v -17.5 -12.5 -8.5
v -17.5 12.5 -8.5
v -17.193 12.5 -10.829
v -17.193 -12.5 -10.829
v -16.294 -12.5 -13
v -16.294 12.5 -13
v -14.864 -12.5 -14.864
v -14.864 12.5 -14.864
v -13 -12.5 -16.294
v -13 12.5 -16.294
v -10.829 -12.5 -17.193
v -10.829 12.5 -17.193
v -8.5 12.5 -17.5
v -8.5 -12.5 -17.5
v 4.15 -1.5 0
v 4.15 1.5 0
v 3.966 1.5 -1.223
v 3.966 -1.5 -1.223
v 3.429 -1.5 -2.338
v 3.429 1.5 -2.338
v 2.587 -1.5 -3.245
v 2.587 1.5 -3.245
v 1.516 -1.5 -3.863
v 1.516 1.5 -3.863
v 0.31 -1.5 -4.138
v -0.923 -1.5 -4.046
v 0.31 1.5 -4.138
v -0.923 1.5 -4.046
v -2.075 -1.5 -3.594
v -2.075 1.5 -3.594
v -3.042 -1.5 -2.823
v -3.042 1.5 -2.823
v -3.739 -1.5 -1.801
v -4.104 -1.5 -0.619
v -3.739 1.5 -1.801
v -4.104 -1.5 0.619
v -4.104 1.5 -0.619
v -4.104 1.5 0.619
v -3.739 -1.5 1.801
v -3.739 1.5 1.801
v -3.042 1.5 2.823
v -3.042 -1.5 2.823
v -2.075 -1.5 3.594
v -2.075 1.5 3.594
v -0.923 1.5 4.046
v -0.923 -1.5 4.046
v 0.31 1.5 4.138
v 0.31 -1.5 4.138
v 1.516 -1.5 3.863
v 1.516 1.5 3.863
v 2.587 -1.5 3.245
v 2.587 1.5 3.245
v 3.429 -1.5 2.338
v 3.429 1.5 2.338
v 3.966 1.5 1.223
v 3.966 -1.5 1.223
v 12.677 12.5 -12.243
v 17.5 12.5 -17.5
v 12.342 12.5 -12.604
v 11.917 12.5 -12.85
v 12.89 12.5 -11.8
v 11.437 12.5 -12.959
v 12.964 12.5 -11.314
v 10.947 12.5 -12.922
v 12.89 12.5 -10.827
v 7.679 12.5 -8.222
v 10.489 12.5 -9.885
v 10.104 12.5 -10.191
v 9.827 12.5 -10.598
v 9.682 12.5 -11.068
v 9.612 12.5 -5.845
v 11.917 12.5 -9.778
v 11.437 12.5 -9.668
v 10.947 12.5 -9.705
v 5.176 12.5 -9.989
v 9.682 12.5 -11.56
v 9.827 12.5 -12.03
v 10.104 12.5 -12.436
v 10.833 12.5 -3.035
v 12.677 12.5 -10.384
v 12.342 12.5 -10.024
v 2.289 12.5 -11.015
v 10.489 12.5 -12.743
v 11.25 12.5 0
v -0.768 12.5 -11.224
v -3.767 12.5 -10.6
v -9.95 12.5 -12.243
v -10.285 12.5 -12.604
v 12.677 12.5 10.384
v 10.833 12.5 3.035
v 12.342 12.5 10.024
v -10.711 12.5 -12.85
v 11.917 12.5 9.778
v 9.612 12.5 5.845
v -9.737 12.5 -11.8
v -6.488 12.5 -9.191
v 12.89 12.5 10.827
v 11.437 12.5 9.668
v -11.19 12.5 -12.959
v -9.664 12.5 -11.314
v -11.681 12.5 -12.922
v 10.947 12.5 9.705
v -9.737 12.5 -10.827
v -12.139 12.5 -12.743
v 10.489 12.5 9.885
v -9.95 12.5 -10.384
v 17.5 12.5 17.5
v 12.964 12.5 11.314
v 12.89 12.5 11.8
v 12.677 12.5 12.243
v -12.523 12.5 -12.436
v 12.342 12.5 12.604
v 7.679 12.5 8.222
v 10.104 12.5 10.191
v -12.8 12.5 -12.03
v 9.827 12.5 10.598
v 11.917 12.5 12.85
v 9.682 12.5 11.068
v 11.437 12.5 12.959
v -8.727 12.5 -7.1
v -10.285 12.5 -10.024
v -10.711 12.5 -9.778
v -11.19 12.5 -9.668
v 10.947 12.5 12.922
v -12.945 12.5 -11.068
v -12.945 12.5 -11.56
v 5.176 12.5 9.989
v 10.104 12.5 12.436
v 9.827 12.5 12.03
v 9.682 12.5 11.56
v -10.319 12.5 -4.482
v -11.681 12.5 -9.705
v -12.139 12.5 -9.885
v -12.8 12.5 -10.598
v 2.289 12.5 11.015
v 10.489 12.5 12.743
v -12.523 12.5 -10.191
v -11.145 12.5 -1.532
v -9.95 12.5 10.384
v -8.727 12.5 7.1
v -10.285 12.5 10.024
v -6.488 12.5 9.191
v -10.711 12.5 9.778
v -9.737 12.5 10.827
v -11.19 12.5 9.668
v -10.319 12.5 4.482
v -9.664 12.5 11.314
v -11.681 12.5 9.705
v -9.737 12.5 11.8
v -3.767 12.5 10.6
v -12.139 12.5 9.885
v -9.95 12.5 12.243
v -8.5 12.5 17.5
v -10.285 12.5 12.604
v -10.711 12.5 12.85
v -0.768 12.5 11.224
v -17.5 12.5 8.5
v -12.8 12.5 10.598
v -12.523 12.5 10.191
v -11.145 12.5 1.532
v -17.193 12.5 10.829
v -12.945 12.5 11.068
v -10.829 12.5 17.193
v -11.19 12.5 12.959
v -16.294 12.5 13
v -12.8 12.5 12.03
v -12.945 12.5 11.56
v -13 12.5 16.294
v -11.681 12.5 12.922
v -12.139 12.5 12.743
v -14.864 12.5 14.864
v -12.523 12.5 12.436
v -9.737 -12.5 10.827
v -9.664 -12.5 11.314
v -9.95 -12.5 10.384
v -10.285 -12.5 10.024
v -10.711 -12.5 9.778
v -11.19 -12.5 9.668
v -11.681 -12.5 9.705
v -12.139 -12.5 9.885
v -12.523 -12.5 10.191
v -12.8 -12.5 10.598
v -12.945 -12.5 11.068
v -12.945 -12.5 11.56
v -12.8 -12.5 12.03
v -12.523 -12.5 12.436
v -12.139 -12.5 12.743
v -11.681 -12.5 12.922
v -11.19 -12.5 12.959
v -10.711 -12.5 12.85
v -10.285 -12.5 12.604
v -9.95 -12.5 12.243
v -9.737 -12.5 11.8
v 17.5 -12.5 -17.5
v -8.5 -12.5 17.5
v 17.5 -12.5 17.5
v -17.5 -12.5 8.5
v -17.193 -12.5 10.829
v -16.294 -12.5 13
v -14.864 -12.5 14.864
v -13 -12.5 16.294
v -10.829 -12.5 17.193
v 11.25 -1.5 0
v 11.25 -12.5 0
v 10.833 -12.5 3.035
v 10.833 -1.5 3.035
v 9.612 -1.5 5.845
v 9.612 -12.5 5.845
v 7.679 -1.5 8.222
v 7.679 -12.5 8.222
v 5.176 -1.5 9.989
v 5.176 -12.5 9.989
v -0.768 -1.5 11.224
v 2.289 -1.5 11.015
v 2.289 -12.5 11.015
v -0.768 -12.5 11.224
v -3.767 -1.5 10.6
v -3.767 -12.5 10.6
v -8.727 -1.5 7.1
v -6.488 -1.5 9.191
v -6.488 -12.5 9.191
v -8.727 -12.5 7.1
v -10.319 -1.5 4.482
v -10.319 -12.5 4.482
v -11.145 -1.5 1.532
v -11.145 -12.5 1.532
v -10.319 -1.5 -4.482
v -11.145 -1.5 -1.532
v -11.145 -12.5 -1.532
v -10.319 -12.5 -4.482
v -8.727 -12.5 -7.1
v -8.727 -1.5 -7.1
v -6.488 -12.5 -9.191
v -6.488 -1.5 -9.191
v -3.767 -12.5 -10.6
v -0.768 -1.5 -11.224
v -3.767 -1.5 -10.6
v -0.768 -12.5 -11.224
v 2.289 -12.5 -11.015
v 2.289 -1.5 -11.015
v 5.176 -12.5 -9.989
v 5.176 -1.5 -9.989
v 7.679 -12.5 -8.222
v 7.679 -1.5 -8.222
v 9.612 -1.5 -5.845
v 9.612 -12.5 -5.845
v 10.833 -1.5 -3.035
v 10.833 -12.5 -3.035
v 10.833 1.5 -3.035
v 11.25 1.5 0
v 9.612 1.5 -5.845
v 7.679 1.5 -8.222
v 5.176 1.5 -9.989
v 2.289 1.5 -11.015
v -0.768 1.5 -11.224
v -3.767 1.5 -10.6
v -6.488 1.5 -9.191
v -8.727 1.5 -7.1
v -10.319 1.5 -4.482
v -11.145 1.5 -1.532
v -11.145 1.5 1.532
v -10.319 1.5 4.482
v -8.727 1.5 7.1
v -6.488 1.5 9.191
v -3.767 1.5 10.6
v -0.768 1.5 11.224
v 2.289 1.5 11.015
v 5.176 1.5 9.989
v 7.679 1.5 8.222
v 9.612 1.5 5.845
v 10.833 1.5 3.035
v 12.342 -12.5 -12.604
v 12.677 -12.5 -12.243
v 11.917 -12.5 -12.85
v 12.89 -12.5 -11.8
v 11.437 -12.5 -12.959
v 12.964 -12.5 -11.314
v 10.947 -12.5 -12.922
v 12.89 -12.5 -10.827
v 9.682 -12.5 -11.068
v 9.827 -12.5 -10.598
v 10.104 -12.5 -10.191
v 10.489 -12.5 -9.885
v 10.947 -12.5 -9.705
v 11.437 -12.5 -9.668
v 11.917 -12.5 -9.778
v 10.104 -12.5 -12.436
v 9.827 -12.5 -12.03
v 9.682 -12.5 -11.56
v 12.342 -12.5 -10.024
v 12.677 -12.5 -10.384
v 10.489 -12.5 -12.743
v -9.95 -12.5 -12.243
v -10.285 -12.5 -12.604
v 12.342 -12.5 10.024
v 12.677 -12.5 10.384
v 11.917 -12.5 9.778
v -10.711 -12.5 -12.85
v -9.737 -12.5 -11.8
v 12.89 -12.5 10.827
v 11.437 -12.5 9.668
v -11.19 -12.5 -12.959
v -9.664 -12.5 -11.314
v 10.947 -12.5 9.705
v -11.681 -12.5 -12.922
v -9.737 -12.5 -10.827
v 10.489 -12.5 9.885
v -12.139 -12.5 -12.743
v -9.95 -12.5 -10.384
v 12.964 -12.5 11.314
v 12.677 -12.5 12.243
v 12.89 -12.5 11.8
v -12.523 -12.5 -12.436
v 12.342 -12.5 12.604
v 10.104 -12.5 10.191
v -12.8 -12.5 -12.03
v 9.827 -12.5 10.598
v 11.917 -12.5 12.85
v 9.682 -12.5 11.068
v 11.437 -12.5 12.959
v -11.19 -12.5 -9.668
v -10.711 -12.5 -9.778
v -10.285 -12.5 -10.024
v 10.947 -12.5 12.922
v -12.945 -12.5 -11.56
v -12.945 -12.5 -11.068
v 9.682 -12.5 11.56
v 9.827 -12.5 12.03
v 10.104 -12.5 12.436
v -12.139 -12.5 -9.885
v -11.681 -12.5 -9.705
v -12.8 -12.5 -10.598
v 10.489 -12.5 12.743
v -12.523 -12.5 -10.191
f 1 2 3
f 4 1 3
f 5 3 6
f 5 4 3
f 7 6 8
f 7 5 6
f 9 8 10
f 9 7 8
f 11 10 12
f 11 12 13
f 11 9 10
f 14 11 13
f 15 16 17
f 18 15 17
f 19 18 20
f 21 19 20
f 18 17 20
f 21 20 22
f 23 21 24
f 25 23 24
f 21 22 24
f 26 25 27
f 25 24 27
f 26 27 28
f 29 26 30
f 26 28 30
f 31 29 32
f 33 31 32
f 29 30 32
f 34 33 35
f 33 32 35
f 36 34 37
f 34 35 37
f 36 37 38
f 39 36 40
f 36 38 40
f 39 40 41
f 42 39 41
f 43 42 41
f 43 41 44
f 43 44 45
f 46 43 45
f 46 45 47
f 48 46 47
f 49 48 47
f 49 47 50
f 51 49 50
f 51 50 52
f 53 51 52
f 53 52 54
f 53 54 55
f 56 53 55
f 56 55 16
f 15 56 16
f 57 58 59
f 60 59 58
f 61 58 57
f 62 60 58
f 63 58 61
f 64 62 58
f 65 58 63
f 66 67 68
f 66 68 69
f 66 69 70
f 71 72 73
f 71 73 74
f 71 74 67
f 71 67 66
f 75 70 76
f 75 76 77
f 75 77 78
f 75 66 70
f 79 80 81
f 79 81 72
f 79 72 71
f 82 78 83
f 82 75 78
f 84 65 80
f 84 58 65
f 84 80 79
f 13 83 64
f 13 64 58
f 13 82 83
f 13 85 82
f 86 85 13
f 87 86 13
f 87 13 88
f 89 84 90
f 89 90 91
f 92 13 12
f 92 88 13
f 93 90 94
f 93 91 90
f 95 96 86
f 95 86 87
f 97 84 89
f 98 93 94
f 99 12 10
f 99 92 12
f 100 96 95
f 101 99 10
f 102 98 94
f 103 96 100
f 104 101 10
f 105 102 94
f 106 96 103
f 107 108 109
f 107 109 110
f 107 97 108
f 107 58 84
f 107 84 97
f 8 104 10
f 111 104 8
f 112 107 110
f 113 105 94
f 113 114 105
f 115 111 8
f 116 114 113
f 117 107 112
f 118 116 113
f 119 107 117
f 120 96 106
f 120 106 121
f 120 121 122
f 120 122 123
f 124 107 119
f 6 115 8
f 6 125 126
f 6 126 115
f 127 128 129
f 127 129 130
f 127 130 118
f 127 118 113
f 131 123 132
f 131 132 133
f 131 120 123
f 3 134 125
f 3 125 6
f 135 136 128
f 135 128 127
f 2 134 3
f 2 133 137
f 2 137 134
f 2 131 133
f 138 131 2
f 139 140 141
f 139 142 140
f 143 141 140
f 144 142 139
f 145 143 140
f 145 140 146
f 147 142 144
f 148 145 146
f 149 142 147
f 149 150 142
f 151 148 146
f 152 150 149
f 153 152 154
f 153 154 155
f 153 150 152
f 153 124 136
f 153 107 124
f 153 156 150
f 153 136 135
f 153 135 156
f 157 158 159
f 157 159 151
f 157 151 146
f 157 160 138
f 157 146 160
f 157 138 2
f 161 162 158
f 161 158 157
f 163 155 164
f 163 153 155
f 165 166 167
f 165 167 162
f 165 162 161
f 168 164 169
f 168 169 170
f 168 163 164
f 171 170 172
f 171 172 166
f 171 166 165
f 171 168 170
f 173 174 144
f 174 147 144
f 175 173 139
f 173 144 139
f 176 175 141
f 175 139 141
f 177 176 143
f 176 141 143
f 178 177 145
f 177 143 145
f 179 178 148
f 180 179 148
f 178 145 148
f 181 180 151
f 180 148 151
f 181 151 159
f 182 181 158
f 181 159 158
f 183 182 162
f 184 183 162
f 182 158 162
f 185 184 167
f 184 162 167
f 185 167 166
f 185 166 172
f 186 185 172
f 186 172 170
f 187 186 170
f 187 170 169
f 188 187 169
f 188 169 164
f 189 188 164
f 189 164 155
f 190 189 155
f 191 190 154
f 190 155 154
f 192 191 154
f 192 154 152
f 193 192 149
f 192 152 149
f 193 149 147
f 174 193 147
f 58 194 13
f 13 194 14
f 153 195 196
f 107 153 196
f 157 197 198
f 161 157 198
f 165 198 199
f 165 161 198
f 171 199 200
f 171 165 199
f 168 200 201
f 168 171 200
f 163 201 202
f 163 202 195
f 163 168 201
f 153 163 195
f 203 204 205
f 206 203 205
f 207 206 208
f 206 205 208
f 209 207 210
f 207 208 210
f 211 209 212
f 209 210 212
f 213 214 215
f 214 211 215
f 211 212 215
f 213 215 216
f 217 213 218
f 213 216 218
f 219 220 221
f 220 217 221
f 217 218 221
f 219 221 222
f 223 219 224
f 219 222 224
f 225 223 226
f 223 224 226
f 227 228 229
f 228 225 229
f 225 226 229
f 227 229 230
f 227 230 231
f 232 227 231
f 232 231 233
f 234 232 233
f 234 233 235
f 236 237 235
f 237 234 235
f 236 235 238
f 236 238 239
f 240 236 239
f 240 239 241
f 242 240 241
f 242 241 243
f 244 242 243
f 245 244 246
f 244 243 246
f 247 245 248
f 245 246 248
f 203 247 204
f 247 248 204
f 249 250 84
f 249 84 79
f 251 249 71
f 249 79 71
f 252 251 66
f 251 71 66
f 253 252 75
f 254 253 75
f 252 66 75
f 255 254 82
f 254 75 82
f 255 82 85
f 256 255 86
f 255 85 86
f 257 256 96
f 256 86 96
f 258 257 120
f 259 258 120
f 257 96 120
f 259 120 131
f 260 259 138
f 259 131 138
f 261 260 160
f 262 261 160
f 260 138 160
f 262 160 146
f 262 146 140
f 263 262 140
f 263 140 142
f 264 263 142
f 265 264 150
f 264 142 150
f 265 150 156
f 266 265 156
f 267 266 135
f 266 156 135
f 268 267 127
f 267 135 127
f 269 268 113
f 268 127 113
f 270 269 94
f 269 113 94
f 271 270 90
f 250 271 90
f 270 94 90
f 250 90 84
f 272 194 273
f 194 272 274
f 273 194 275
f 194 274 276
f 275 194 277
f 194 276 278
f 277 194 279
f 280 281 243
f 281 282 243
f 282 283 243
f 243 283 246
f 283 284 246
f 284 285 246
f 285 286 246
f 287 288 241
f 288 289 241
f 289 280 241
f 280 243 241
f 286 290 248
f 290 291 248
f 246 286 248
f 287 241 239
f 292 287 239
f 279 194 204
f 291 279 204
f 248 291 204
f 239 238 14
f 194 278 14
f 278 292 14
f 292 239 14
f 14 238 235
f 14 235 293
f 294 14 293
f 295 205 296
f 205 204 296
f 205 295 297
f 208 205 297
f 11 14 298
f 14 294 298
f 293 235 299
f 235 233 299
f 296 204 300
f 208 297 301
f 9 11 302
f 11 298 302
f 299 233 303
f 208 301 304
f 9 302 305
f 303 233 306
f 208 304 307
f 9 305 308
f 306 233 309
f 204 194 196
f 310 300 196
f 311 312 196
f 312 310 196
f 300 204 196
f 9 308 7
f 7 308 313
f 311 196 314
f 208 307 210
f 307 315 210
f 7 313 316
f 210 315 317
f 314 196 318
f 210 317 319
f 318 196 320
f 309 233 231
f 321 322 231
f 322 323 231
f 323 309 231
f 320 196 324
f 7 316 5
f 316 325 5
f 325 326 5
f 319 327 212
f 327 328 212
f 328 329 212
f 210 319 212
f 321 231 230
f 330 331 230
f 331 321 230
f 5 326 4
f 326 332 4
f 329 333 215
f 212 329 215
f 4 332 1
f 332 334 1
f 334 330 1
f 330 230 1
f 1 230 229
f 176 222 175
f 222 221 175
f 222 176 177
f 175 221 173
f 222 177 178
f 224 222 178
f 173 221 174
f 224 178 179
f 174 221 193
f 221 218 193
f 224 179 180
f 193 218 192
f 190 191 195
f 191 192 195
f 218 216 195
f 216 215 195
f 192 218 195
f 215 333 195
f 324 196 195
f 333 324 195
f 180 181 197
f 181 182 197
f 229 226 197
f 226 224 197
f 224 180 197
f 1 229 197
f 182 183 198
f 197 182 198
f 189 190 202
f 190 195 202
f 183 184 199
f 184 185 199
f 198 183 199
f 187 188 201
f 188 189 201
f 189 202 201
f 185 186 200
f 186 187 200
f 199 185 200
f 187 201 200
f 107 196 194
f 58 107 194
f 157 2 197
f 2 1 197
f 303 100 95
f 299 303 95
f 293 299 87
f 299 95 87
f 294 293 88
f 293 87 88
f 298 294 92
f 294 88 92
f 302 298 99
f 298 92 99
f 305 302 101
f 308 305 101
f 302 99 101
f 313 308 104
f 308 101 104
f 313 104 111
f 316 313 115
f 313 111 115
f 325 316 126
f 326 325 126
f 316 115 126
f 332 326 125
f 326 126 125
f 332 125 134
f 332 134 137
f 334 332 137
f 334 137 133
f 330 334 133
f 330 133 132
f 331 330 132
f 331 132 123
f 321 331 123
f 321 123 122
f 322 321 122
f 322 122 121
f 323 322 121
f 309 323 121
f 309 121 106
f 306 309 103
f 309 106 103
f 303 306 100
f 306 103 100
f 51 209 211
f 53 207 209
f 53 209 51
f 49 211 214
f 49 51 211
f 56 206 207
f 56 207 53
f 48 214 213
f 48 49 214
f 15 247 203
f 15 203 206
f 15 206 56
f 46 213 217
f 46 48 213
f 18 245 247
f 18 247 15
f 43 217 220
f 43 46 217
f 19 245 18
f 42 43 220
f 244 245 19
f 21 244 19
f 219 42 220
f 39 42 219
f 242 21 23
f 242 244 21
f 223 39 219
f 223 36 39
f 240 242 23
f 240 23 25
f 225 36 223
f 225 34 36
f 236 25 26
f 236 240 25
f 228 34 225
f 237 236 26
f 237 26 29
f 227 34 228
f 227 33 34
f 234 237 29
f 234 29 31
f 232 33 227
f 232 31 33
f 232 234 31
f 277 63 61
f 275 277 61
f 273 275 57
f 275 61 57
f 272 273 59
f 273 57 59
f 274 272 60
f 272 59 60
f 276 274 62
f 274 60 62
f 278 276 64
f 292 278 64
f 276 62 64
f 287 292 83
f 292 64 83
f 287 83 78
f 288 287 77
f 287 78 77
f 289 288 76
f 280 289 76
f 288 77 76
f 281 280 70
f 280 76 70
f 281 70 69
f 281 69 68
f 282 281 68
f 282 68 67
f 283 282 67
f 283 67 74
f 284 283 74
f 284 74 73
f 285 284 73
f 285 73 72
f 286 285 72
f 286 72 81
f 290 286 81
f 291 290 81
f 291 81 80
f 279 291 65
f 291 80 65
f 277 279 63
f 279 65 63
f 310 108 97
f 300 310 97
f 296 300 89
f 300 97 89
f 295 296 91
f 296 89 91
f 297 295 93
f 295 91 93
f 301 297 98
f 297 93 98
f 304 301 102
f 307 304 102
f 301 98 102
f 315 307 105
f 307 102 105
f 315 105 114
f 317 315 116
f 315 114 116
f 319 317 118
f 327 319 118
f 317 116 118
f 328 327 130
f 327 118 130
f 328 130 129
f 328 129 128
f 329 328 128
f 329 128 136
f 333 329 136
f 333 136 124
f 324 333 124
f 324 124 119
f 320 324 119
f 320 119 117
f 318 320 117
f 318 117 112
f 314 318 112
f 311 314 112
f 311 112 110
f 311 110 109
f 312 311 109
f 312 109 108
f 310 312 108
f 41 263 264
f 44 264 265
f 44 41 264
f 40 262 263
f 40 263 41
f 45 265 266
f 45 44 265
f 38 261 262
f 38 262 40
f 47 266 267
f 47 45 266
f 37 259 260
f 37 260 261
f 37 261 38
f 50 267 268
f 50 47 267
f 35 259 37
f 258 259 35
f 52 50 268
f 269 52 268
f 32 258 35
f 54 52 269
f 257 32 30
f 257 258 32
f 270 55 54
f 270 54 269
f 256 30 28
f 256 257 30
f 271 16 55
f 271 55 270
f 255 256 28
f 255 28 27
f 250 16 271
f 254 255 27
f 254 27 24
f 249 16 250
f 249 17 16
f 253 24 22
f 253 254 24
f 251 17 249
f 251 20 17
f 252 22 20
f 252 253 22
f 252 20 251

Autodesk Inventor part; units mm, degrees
ref_plane "YZ Plane" through (0, 0, 0) normal (1, 0, 0) x (0, 1, 0)
ref_plane "XZ Plane" through (0, 0, 0) normal (0, 1, 0) x (-1, 0, 0)
ref_plane "XY Plane" through (0, 0, 0) normal (0, 0, 1) x (1, 0, 0)
sketch "Sketch1" plane through (0, 0, 0) normal (0, 1, 0) x (-1, 0, 0)
  line L0 (17.5, 17.5) -> (-17.5, 17.5)
  line L1 (-17.5, 17.5) -> (-17.5, -17.5)
  line L2 (-17.5, -17.5) -> (17.5, -17.5)
  line L3 (17.5, -17.5) -> (17.5, 17.5)
  line L4 (17.5, 17.5) -> (-17.5, -17.5) construction
  line L5 (-17.5, 17.5) -> (17.5, -17.5) construction
  point P0 (0, 0)
  dimension "d0" = 35
  dimension "d1" = 35
extrude "Extrusion1" add sketch "Sketch1" along normal mid plane 25
sketch "Sketch2" plane through (0, 12.5, 0) normal (0, 1, 0) x (1, 0, 0)
  circle A0 centre (0, 0) radius 4.15
  dimension "d4" = 8.3
extrude "Extrusion2" cut sketch "Sketch2" against normal blind 25
sketch "Sketch3" plane through (0, 12.5, 0) normal (0, 1, 0) x (1, 0, 0)
  circle A0 centre (0, 0) radius 11.25
  dimension "d7" = 22.5
extrude "Extrusion3" cut sketch "Sketch3" against normal blind 11
sketch "Sketch4" plane through (0, 12.5, 0) normal (0, 1, 0) x (1, 0, 0)
  circle A0 centre (0, 0) radius 4.15 projected
  circle A1 centre (0, 0) radius 16
  line L0 (17.5, 17.5) -> (-17.5, 17.5) projected
  line L1 (-17.5, -17.5) -> (17.5, -17.5) projected
  line L2 (17.5, 17.5) -> (-17.5, -17.5)
  line L3 (-17.5, 17.5) -> (17.5, -17.5)
  circle A2 centre (11.3137, 11.3137) radius 1.65
  circle A3 centre (-11.3137, 11.3137) radius 1.65
  circle A4 centre (-11.3137, -11.3137) radius 1.65
  circle A5 centre (11.3137, -11.3137) radius 1.65
  dimension "d10" = 32
  dimension "d11" = 3.3
  dimension "d14" = 360
extrude "Extrusion4" cut sketch "Sketch4" against normal blind 25 contours A2 A1 L2 | L2 A1 A2 | A5 A1 L3 | L3 A1 A5 | A3 A1 L3 | L3 A1 A3 | L2 A2 A1 | A1 A2 L2 | A4 A1 L2 | L2 A1 A4 | L3 A5 A1 | A1 A5 L3 | L3 A3 A1 | A1 A3 L3 | L2 A4 A1 | A1 A4 L2
fillet "Fillet1" radius 9 2 edges at (-17.5, 0, -17.5) (-17.5, 0, 17.5)
mirror "Mirror1" about plane through (0, 0, 0) normal (0, 1, 0) of "Extrusion3"
properties part number "PART_!"
